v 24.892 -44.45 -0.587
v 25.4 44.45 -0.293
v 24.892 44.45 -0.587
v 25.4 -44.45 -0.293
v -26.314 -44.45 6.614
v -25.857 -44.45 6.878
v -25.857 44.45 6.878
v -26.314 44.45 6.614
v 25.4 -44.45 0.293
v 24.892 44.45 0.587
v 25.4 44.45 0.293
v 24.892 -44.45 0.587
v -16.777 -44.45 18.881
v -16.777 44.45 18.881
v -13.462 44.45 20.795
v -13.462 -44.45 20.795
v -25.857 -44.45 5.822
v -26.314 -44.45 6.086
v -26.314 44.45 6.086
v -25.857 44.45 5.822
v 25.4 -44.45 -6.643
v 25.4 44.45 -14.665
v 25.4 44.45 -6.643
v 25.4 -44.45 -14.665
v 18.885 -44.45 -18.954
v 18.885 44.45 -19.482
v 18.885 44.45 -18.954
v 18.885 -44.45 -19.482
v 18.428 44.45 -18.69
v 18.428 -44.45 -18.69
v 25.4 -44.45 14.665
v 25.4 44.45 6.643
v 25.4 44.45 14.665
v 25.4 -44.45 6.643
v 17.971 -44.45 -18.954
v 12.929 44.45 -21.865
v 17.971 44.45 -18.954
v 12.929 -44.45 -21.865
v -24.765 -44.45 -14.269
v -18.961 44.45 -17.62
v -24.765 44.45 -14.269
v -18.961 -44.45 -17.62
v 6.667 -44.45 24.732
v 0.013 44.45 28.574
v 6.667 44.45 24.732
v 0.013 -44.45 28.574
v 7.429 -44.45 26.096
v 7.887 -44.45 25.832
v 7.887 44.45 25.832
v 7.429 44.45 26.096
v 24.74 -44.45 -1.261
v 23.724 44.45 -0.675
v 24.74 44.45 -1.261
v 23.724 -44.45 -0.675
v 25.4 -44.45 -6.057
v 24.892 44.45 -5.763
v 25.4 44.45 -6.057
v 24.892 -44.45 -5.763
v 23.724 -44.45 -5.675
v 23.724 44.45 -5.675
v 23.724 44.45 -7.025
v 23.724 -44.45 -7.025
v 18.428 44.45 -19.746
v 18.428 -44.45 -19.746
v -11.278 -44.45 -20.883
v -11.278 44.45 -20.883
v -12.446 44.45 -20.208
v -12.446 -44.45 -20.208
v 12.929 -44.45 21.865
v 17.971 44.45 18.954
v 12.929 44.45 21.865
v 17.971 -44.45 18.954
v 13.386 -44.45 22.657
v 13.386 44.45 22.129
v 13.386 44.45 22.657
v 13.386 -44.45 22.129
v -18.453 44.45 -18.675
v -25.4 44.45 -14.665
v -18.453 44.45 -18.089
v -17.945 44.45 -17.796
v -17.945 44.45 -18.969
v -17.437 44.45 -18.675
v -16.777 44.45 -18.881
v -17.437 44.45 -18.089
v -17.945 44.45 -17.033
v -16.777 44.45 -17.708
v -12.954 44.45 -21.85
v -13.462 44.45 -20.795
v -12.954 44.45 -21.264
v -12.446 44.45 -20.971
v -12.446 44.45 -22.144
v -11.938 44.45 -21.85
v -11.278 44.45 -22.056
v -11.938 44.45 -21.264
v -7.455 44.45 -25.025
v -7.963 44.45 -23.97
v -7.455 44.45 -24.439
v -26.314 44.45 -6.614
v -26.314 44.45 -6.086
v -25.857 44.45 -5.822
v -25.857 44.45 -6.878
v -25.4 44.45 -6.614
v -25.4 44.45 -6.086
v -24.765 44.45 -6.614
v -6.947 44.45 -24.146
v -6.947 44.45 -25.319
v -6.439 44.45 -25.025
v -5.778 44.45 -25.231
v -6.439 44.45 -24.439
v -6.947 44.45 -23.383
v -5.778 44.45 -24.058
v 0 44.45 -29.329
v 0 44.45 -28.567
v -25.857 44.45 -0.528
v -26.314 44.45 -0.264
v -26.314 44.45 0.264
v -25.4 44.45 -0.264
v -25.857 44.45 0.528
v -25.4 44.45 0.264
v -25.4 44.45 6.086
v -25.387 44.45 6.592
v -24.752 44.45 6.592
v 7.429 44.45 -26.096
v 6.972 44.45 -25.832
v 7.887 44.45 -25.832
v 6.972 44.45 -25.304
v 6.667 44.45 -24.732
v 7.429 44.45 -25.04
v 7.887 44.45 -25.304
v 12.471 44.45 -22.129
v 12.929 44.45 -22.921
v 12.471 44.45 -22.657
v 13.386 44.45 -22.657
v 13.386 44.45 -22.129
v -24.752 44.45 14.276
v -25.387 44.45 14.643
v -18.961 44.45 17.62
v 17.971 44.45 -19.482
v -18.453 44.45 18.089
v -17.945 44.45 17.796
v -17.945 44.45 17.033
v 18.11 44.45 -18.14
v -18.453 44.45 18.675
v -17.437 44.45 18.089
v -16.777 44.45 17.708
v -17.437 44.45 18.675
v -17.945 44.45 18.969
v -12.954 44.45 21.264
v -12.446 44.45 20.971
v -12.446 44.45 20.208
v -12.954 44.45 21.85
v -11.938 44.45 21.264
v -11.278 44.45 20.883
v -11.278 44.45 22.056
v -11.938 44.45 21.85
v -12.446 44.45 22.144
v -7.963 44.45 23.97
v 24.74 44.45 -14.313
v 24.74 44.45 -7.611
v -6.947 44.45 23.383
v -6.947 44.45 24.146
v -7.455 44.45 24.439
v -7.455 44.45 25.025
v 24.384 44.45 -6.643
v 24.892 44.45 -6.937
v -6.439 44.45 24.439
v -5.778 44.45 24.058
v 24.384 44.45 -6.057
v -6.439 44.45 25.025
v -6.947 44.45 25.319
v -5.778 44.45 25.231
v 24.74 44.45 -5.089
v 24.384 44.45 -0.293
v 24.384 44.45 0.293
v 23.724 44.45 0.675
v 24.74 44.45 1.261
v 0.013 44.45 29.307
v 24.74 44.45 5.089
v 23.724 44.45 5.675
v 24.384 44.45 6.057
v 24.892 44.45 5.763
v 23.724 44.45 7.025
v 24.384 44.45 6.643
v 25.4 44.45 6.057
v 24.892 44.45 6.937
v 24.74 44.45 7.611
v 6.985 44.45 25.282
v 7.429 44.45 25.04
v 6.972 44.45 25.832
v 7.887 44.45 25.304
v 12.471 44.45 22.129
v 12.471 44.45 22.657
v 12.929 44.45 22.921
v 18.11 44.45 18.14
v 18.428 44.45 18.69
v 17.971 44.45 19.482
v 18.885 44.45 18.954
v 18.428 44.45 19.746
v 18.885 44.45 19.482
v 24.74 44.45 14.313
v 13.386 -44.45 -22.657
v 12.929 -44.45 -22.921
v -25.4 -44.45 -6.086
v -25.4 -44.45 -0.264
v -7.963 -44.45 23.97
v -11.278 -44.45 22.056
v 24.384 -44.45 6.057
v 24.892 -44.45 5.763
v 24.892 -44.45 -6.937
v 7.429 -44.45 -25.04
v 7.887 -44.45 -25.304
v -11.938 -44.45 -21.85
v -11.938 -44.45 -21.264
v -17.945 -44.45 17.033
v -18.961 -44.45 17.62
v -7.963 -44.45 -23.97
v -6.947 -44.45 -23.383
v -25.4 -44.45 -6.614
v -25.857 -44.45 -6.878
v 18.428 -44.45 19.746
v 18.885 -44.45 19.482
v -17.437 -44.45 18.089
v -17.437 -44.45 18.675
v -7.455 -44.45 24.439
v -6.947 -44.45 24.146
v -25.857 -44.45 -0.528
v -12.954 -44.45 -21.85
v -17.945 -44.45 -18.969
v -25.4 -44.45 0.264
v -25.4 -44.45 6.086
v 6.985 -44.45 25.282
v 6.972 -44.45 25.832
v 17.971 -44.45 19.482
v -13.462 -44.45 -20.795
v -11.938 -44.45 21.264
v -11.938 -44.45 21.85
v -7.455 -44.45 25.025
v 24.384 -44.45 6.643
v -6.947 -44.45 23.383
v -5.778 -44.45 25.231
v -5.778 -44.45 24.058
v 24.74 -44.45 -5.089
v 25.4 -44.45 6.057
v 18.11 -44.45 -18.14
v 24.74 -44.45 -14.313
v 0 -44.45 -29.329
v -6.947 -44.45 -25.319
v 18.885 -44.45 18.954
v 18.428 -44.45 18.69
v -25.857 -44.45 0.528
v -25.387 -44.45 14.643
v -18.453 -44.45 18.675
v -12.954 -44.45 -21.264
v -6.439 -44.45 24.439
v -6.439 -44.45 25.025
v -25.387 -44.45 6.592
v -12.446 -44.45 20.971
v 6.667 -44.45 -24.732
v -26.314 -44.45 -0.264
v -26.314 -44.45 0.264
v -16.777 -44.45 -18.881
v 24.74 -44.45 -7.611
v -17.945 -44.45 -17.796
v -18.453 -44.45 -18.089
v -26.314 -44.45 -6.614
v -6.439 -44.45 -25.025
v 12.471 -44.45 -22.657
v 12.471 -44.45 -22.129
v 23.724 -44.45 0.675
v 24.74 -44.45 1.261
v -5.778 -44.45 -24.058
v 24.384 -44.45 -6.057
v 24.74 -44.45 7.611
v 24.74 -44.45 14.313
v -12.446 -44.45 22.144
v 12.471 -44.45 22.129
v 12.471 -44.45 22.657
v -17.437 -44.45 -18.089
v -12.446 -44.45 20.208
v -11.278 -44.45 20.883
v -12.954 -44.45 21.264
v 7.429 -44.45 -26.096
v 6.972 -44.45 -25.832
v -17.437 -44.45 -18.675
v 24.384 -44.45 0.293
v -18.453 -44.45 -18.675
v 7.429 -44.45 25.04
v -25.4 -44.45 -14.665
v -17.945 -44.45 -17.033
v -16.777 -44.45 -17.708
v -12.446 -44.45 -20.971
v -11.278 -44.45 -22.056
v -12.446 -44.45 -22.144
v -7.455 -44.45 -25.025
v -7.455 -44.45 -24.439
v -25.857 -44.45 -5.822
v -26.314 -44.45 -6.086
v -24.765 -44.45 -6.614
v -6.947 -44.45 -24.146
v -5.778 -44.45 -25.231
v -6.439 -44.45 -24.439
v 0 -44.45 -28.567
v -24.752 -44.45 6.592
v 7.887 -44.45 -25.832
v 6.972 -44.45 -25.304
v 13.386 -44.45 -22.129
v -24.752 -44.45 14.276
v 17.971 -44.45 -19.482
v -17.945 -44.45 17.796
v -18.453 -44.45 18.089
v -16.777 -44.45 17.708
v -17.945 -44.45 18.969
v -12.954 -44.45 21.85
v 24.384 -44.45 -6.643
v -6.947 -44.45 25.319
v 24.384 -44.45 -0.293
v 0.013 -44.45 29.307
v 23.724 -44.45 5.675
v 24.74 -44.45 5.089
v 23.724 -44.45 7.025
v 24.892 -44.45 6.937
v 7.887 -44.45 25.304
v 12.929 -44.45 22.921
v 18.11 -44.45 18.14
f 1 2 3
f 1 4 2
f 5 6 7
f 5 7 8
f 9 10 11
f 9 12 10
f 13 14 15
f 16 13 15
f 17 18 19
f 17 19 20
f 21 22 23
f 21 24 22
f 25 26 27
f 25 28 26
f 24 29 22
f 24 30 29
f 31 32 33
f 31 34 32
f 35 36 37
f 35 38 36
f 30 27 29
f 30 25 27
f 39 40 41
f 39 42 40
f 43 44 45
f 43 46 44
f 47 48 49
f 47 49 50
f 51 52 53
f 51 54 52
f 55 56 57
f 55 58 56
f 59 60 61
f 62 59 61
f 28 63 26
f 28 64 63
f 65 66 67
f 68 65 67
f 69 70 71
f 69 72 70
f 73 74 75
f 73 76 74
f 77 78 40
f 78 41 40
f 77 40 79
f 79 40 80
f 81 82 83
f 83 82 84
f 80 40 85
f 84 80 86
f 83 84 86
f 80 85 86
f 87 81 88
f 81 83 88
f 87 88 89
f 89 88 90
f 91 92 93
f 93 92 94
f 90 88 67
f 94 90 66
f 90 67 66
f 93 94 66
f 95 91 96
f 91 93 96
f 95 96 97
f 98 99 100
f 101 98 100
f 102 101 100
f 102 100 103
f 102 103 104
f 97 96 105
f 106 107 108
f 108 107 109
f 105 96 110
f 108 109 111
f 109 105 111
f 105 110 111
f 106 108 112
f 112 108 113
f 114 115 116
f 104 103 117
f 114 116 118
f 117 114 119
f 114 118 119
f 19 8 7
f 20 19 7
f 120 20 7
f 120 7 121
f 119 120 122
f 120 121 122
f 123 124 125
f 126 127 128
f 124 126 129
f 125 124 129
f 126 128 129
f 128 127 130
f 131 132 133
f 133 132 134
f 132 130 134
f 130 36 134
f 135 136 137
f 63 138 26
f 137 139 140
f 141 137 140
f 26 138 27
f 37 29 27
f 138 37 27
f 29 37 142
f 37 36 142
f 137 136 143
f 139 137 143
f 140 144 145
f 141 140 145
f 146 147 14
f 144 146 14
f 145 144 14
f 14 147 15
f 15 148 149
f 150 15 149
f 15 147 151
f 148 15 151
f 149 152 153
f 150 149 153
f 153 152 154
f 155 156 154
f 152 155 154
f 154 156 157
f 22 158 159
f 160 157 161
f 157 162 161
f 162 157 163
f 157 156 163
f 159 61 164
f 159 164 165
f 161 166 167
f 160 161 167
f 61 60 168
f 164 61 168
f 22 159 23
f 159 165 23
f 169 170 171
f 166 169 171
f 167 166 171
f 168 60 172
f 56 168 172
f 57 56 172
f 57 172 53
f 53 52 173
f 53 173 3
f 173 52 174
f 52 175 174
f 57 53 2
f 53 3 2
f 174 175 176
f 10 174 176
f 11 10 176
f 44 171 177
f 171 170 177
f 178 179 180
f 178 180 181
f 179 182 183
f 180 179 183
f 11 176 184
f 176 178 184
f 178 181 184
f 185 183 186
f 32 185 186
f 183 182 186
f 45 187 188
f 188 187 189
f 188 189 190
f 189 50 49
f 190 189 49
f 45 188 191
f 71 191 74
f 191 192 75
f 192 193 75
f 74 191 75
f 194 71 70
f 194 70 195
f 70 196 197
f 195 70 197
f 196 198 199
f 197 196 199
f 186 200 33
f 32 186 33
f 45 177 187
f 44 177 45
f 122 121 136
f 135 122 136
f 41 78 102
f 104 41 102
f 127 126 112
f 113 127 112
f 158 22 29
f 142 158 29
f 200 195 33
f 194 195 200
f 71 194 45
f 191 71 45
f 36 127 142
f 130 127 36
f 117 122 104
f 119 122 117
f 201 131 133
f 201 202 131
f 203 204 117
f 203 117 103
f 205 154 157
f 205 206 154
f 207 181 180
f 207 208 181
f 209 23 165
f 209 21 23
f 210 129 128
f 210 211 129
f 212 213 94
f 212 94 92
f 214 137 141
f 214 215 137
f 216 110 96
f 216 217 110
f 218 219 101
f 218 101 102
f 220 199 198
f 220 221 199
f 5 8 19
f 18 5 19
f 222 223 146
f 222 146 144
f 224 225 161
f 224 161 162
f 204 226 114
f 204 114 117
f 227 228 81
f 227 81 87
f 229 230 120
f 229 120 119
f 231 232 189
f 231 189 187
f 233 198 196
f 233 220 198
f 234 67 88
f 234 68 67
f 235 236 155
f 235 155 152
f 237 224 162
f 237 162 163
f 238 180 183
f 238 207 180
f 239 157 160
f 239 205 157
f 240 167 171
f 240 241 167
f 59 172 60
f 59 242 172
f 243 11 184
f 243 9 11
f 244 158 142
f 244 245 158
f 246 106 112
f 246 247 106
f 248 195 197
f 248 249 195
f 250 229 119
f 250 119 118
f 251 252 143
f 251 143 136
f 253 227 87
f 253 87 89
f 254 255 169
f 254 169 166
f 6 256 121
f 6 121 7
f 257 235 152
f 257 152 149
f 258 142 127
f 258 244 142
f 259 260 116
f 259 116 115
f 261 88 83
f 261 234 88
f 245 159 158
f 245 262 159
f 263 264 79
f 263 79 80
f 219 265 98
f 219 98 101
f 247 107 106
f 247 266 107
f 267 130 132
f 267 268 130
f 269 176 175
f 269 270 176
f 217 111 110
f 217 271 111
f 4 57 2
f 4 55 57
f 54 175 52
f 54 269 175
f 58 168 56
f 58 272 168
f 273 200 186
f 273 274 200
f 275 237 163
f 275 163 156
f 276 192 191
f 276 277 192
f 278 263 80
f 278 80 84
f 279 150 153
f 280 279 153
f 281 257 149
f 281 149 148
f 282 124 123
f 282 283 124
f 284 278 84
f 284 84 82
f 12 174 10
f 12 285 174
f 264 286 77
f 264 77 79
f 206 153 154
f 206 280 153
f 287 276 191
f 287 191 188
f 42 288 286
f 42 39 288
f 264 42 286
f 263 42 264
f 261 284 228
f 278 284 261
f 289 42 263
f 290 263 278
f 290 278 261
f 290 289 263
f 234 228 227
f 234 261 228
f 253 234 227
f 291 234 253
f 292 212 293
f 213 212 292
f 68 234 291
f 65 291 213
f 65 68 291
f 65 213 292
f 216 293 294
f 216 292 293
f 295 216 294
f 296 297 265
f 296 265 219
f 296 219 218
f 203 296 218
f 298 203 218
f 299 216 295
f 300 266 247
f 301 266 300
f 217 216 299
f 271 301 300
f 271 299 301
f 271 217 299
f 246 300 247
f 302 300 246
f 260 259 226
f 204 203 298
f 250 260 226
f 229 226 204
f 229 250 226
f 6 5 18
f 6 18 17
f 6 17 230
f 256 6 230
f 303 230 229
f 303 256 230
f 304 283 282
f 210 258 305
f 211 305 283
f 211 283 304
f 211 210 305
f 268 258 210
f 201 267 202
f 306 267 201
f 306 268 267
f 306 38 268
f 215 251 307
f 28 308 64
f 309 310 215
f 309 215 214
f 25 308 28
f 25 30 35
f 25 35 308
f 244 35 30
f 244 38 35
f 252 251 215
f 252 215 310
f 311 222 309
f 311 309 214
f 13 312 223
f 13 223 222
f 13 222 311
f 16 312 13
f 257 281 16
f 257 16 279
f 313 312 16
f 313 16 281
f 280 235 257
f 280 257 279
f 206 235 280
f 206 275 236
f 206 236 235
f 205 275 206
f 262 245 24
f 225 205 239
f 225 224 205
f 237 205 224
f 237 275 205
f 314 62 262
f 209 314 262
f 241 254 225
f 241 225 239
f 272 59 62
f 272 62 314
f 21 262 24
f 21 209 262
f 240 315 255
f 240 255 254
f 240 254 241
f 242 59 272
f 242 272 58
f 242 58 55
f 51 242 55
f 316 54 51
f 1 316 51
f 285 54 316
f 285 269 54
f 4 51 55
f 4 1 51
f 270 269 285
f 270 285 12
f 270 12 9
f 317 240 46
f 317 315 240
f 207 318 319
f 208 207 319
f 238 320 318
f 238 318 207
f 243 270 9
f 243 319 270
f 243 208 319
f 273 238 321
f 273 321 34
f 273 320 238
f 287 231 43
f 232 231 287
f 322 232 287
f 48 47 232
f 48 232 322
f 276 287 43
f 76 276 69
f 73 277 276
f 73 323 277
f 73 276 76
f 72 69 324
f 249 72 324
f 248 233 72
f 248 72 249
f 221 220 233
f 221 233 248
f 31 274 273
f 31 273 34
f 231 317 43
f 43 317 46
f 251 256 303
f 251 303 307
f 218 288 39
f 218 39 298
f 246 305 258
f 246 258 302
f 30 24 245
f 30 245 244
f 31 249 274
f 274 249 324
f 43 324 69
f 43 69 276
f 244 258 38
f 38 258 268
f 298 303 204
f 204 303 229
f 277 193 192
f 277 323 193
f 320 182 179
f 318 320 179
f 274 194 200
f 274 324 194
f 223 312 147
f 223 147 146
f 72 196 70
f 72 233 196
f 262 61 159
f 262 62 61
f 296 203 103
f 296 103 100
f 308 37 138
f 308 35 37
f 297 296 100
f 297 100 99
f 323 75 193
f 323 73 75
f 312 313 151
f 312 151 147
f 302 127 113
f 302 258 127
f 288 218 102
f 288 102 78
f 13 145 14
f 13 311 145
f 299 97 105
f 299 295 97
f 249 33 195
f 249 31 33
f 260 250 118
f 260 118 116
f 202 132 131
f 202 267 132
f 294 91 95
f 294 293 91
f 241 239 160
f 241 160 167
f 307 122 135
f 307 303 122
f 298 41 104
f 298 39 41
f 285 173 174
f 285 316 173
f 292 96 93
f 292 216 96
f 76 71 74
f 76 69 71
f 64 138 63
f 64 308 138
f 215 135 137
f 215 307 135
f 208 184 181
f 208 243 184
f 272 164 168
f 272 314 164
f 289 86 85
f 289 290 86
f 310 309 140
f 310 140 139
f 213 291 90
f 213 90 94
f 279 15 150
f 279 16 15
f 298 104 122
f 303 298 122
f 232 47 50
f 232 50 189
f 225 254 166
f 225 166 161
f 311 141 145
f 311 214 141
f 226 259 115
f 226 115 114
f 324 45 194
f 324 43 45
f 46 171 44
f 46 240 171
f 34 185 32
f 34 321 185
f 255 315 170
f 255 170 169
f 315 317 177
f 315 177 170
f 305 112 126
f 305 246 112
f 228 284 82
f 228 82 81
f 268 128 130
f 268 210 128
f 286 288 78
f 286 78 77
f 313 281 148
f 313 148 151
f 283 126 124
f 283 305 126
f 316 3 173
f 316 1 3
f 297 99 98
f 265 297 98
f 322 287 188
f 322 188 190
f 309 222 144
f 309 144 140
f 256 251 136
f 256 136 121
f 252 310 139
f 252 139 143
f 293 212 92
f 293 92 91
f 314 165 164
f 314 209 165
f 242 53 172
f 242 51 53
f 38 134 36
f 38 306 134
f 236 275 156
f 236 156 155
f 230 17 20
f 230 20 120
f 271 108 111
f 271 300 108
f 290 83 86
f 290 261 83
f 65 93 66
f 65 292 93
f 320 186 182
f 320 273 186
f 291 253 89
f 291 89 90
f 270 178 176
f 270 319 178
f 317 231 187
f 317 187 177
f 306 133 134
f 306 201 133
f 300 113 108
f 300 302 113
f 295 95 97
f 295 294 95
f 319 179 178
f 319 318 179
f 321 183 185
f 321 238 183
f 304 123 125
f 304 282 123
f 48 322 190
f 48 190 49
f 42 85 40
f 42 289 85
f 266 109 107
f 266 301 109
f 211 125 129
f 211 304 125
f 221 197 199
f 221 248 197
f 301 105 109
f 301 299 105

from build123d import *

# Parameters (mm, degrees)
F1_DEPTH = 44.45


with BuildPart() as f1:
    # F0 (on Front) → F1 (new body, symmetric)
    with BuildSketch(Plane.XZ):
        Polygon((12.4714, 22.6569566138), (12.4714, 22.1290275277), (7.429338686, 25.0400629846), (7.886538686, 25.3040275277), (7.886538686, 25.8319566138), (7.429338686, 26.0959211569), (6.972138686, 25.8319566138), (6.984838669, 25.2820305117), (0.0126999831, 29.3073966589), (-6.946738686, 25.3186922245), (-6.438738686, 25.0253982878), (-6.438738686, 24.4388104143), (-6.946738686, 24.1455164775), (-7.454738686, 24.4388104143), (-7.454738686, 25.0253982878), (-12.446, 22.1436922245), (-11.938, 21.8503982878), (-11.938, 21.2638104143), (-12.446, 20.9705164775), (-12.954, 21.2638104143), (-12.954, 21.8503982878), (-17.945261314, 18.9686922245), (-17.437261314, 18.6753982878), (-17.437261314, 18.0888104143), (-17.945261314, 17.7955164775), (-18.453261314, 18.0888104143), (-18.453261314, 18.6753982878), (-25.3873000169, 14.6426998215), (-25.3873000169, 6.5919675272), (-25.8572, 6.8779290861), (-26.3144, 6.6139645431), (-26.3144, 6.0860354569), (-25.8572, 5.8220709139), (-25.4, 6.0860354569), (-25.4, 0.2639645431), (-25.8572, 0.5279290861), (-26.3144, 0.2639645431), (-26.3144, -0.2639645431), (-25.8572, -0.5279290861), (-25.4, -0.2639645431), (-25.4, -6.0860354569), (-25.8572, -5.8220709139), (-26.3144, -6.0860354569), (-26.3144, -6.6139645431), (-25.8572, -6.8779290861), (-25.4, -6.6139645431), (-25.4, -14.6646968374), (-18.453261314, -18.6753982878), (-18.453261314, -18.0888104143), (-17.945261314, -17.7955164775), (-17.437261314, -18.0888104143), (-17.437261314, -18.6753982878), (-17.945261314, -18.9686922245), (-12.954, -21.8503982878), (-12.954, -21.2638104143), (-12.446, -20.9705164775), (-11.938, -21.2638104143), (-11.938, -21.8503982878), (-12.446, -22.1436922245), (-7.454738686, -25.0253982878), (-7.454738686, -24.4388104143), (-6.946738686, -24.1455164775), (-6.438738686, -24.4388104143), (-6.438738686, -25.0253982878), (-6.946738686, -25.3186922245), (0, -29.3293936748), (6.972138686, -25.3040275277), (6.972138686, -25.8319566138), (7.429338686, -26.0959211569), (7.886538686, -25.8319566138), (7.886538686, -25.3040275277), (7.429338686, -25.0400629846), (12.4714, -22.1290275277), (12.4714, -22.6569566138), (12.9286, -22.9209211569), (13.3858, -22.6569566138), (13.3858, -22.1290275277), (12.9286, -21.8650629846), (17.970661314, -18.9540275277), (17.970661314, -19.4819566138), (18.427861314, -19.7459211569), (18.885061314, -19.4819566138), (18.885061314, -18.9540275277), (18.427861314, -18.6900629846), (25.4, -14.6646968374), (25.4, -6.6432939367), (24.892, -6.9365878735), (24.384, -6.6432939367), (24.384, -6.0567060633), (24.892, -5.7634121265), (25.4, -6.0567060633), (25.4, -0.2932939367), (24.892, -0.5865878735), (24.384, -0.2932939367), (24.384, 0.2932939367), (24.892, 0.5865878735), (25.4, 0.2932939367), (25.4, 6.0567060633), (24.892, 5.7634121265), (24.384, 6.0567060633), (24.384, 6.6432939367), (24.892, 6.9365878735), (25.4, 6.6432939367), (25.4, 14.6646968374), (18.427861314, 18.6900629846), (18.885061314, 18.9540275277), (18.885061314, 19.4819566138), (18.427861314, 19.7459211569), (17.970661314, 19.4819566138), (17.970661314, 18.9540275277), (12.9286, 21.8650629846), (13.3858, 22.1290275277), (13.3858, 22.6569566138), (12.9286, 22.9209211569), align=None)
        Polygon((-6.946738686, 23.3829522811), (-5.7783387198, 24.057528316), (-5.7783387198, 25.230704063), (0.0126999831, 28.574161817), (6.667338669, 24.7321043803), (18.110361314, 18.1401368532), (24.7396000339, 14.3127440938), (24.7396000339, 7.6111639085), (23.7236000339, 7.024576035), (23.7236000339, 5.675423965), (24.7396000339, 5.0888360915), (24.7396000339, 1.2611639085), (23.7236000339, 0.674576035), (23.7236000339, -0.674576035), (24.7396000339, -1.2611639085), (24.7396000339, -5.0888360915), (23.7236000339, -5.675423965), (23.7236000339, -7.024576035), (24.7396000339, -7.6111639085), (24.7396000339, -14.3127440938), (18.110361314, -18.1401368532), (6.667338669, -24.7321043803), (0, -28.5668294784), (-5.7783387198, -25.230704063), (-5.7783387198, -24.057528316), (-6.946738686, -23.3829522811), (-7.962738686, -23.9695401546), (-11.2776000339, -22.055704063), (-11.2776000339, -20.882528316), (-12.446, -20.2079522811), (-13.462, -20.7945401546), (-16.7768613479, -18.880704063), (-16.7768613479, -17.707528316), (-17.945261314, -17.0329522811), (-18.961261314, -17.6195401546), (-24.765, -14.2687500619), (-24.765, -6.6139645431), (-24.7523000169, 6.5919675272), (-24.7523000169, 14.2760824006), (-18.961261314, 17.6195401546), (-17.945261314, 17.0329522811), (-16.7768613479, 17.707528316), (-16.7768613479, 18.880704063), (-13.462, 20.7945401546), (-12.446, 20.2079522811), (-11.2776000339, 20.882528316), (-11.2776000339, 22.055704063), (-7.962738686, 23.9695401546), align=None, mode=Mode.SUBTRACT)
    extrude(amount=F1_DEPTH, both=True)


solid = f1.part
